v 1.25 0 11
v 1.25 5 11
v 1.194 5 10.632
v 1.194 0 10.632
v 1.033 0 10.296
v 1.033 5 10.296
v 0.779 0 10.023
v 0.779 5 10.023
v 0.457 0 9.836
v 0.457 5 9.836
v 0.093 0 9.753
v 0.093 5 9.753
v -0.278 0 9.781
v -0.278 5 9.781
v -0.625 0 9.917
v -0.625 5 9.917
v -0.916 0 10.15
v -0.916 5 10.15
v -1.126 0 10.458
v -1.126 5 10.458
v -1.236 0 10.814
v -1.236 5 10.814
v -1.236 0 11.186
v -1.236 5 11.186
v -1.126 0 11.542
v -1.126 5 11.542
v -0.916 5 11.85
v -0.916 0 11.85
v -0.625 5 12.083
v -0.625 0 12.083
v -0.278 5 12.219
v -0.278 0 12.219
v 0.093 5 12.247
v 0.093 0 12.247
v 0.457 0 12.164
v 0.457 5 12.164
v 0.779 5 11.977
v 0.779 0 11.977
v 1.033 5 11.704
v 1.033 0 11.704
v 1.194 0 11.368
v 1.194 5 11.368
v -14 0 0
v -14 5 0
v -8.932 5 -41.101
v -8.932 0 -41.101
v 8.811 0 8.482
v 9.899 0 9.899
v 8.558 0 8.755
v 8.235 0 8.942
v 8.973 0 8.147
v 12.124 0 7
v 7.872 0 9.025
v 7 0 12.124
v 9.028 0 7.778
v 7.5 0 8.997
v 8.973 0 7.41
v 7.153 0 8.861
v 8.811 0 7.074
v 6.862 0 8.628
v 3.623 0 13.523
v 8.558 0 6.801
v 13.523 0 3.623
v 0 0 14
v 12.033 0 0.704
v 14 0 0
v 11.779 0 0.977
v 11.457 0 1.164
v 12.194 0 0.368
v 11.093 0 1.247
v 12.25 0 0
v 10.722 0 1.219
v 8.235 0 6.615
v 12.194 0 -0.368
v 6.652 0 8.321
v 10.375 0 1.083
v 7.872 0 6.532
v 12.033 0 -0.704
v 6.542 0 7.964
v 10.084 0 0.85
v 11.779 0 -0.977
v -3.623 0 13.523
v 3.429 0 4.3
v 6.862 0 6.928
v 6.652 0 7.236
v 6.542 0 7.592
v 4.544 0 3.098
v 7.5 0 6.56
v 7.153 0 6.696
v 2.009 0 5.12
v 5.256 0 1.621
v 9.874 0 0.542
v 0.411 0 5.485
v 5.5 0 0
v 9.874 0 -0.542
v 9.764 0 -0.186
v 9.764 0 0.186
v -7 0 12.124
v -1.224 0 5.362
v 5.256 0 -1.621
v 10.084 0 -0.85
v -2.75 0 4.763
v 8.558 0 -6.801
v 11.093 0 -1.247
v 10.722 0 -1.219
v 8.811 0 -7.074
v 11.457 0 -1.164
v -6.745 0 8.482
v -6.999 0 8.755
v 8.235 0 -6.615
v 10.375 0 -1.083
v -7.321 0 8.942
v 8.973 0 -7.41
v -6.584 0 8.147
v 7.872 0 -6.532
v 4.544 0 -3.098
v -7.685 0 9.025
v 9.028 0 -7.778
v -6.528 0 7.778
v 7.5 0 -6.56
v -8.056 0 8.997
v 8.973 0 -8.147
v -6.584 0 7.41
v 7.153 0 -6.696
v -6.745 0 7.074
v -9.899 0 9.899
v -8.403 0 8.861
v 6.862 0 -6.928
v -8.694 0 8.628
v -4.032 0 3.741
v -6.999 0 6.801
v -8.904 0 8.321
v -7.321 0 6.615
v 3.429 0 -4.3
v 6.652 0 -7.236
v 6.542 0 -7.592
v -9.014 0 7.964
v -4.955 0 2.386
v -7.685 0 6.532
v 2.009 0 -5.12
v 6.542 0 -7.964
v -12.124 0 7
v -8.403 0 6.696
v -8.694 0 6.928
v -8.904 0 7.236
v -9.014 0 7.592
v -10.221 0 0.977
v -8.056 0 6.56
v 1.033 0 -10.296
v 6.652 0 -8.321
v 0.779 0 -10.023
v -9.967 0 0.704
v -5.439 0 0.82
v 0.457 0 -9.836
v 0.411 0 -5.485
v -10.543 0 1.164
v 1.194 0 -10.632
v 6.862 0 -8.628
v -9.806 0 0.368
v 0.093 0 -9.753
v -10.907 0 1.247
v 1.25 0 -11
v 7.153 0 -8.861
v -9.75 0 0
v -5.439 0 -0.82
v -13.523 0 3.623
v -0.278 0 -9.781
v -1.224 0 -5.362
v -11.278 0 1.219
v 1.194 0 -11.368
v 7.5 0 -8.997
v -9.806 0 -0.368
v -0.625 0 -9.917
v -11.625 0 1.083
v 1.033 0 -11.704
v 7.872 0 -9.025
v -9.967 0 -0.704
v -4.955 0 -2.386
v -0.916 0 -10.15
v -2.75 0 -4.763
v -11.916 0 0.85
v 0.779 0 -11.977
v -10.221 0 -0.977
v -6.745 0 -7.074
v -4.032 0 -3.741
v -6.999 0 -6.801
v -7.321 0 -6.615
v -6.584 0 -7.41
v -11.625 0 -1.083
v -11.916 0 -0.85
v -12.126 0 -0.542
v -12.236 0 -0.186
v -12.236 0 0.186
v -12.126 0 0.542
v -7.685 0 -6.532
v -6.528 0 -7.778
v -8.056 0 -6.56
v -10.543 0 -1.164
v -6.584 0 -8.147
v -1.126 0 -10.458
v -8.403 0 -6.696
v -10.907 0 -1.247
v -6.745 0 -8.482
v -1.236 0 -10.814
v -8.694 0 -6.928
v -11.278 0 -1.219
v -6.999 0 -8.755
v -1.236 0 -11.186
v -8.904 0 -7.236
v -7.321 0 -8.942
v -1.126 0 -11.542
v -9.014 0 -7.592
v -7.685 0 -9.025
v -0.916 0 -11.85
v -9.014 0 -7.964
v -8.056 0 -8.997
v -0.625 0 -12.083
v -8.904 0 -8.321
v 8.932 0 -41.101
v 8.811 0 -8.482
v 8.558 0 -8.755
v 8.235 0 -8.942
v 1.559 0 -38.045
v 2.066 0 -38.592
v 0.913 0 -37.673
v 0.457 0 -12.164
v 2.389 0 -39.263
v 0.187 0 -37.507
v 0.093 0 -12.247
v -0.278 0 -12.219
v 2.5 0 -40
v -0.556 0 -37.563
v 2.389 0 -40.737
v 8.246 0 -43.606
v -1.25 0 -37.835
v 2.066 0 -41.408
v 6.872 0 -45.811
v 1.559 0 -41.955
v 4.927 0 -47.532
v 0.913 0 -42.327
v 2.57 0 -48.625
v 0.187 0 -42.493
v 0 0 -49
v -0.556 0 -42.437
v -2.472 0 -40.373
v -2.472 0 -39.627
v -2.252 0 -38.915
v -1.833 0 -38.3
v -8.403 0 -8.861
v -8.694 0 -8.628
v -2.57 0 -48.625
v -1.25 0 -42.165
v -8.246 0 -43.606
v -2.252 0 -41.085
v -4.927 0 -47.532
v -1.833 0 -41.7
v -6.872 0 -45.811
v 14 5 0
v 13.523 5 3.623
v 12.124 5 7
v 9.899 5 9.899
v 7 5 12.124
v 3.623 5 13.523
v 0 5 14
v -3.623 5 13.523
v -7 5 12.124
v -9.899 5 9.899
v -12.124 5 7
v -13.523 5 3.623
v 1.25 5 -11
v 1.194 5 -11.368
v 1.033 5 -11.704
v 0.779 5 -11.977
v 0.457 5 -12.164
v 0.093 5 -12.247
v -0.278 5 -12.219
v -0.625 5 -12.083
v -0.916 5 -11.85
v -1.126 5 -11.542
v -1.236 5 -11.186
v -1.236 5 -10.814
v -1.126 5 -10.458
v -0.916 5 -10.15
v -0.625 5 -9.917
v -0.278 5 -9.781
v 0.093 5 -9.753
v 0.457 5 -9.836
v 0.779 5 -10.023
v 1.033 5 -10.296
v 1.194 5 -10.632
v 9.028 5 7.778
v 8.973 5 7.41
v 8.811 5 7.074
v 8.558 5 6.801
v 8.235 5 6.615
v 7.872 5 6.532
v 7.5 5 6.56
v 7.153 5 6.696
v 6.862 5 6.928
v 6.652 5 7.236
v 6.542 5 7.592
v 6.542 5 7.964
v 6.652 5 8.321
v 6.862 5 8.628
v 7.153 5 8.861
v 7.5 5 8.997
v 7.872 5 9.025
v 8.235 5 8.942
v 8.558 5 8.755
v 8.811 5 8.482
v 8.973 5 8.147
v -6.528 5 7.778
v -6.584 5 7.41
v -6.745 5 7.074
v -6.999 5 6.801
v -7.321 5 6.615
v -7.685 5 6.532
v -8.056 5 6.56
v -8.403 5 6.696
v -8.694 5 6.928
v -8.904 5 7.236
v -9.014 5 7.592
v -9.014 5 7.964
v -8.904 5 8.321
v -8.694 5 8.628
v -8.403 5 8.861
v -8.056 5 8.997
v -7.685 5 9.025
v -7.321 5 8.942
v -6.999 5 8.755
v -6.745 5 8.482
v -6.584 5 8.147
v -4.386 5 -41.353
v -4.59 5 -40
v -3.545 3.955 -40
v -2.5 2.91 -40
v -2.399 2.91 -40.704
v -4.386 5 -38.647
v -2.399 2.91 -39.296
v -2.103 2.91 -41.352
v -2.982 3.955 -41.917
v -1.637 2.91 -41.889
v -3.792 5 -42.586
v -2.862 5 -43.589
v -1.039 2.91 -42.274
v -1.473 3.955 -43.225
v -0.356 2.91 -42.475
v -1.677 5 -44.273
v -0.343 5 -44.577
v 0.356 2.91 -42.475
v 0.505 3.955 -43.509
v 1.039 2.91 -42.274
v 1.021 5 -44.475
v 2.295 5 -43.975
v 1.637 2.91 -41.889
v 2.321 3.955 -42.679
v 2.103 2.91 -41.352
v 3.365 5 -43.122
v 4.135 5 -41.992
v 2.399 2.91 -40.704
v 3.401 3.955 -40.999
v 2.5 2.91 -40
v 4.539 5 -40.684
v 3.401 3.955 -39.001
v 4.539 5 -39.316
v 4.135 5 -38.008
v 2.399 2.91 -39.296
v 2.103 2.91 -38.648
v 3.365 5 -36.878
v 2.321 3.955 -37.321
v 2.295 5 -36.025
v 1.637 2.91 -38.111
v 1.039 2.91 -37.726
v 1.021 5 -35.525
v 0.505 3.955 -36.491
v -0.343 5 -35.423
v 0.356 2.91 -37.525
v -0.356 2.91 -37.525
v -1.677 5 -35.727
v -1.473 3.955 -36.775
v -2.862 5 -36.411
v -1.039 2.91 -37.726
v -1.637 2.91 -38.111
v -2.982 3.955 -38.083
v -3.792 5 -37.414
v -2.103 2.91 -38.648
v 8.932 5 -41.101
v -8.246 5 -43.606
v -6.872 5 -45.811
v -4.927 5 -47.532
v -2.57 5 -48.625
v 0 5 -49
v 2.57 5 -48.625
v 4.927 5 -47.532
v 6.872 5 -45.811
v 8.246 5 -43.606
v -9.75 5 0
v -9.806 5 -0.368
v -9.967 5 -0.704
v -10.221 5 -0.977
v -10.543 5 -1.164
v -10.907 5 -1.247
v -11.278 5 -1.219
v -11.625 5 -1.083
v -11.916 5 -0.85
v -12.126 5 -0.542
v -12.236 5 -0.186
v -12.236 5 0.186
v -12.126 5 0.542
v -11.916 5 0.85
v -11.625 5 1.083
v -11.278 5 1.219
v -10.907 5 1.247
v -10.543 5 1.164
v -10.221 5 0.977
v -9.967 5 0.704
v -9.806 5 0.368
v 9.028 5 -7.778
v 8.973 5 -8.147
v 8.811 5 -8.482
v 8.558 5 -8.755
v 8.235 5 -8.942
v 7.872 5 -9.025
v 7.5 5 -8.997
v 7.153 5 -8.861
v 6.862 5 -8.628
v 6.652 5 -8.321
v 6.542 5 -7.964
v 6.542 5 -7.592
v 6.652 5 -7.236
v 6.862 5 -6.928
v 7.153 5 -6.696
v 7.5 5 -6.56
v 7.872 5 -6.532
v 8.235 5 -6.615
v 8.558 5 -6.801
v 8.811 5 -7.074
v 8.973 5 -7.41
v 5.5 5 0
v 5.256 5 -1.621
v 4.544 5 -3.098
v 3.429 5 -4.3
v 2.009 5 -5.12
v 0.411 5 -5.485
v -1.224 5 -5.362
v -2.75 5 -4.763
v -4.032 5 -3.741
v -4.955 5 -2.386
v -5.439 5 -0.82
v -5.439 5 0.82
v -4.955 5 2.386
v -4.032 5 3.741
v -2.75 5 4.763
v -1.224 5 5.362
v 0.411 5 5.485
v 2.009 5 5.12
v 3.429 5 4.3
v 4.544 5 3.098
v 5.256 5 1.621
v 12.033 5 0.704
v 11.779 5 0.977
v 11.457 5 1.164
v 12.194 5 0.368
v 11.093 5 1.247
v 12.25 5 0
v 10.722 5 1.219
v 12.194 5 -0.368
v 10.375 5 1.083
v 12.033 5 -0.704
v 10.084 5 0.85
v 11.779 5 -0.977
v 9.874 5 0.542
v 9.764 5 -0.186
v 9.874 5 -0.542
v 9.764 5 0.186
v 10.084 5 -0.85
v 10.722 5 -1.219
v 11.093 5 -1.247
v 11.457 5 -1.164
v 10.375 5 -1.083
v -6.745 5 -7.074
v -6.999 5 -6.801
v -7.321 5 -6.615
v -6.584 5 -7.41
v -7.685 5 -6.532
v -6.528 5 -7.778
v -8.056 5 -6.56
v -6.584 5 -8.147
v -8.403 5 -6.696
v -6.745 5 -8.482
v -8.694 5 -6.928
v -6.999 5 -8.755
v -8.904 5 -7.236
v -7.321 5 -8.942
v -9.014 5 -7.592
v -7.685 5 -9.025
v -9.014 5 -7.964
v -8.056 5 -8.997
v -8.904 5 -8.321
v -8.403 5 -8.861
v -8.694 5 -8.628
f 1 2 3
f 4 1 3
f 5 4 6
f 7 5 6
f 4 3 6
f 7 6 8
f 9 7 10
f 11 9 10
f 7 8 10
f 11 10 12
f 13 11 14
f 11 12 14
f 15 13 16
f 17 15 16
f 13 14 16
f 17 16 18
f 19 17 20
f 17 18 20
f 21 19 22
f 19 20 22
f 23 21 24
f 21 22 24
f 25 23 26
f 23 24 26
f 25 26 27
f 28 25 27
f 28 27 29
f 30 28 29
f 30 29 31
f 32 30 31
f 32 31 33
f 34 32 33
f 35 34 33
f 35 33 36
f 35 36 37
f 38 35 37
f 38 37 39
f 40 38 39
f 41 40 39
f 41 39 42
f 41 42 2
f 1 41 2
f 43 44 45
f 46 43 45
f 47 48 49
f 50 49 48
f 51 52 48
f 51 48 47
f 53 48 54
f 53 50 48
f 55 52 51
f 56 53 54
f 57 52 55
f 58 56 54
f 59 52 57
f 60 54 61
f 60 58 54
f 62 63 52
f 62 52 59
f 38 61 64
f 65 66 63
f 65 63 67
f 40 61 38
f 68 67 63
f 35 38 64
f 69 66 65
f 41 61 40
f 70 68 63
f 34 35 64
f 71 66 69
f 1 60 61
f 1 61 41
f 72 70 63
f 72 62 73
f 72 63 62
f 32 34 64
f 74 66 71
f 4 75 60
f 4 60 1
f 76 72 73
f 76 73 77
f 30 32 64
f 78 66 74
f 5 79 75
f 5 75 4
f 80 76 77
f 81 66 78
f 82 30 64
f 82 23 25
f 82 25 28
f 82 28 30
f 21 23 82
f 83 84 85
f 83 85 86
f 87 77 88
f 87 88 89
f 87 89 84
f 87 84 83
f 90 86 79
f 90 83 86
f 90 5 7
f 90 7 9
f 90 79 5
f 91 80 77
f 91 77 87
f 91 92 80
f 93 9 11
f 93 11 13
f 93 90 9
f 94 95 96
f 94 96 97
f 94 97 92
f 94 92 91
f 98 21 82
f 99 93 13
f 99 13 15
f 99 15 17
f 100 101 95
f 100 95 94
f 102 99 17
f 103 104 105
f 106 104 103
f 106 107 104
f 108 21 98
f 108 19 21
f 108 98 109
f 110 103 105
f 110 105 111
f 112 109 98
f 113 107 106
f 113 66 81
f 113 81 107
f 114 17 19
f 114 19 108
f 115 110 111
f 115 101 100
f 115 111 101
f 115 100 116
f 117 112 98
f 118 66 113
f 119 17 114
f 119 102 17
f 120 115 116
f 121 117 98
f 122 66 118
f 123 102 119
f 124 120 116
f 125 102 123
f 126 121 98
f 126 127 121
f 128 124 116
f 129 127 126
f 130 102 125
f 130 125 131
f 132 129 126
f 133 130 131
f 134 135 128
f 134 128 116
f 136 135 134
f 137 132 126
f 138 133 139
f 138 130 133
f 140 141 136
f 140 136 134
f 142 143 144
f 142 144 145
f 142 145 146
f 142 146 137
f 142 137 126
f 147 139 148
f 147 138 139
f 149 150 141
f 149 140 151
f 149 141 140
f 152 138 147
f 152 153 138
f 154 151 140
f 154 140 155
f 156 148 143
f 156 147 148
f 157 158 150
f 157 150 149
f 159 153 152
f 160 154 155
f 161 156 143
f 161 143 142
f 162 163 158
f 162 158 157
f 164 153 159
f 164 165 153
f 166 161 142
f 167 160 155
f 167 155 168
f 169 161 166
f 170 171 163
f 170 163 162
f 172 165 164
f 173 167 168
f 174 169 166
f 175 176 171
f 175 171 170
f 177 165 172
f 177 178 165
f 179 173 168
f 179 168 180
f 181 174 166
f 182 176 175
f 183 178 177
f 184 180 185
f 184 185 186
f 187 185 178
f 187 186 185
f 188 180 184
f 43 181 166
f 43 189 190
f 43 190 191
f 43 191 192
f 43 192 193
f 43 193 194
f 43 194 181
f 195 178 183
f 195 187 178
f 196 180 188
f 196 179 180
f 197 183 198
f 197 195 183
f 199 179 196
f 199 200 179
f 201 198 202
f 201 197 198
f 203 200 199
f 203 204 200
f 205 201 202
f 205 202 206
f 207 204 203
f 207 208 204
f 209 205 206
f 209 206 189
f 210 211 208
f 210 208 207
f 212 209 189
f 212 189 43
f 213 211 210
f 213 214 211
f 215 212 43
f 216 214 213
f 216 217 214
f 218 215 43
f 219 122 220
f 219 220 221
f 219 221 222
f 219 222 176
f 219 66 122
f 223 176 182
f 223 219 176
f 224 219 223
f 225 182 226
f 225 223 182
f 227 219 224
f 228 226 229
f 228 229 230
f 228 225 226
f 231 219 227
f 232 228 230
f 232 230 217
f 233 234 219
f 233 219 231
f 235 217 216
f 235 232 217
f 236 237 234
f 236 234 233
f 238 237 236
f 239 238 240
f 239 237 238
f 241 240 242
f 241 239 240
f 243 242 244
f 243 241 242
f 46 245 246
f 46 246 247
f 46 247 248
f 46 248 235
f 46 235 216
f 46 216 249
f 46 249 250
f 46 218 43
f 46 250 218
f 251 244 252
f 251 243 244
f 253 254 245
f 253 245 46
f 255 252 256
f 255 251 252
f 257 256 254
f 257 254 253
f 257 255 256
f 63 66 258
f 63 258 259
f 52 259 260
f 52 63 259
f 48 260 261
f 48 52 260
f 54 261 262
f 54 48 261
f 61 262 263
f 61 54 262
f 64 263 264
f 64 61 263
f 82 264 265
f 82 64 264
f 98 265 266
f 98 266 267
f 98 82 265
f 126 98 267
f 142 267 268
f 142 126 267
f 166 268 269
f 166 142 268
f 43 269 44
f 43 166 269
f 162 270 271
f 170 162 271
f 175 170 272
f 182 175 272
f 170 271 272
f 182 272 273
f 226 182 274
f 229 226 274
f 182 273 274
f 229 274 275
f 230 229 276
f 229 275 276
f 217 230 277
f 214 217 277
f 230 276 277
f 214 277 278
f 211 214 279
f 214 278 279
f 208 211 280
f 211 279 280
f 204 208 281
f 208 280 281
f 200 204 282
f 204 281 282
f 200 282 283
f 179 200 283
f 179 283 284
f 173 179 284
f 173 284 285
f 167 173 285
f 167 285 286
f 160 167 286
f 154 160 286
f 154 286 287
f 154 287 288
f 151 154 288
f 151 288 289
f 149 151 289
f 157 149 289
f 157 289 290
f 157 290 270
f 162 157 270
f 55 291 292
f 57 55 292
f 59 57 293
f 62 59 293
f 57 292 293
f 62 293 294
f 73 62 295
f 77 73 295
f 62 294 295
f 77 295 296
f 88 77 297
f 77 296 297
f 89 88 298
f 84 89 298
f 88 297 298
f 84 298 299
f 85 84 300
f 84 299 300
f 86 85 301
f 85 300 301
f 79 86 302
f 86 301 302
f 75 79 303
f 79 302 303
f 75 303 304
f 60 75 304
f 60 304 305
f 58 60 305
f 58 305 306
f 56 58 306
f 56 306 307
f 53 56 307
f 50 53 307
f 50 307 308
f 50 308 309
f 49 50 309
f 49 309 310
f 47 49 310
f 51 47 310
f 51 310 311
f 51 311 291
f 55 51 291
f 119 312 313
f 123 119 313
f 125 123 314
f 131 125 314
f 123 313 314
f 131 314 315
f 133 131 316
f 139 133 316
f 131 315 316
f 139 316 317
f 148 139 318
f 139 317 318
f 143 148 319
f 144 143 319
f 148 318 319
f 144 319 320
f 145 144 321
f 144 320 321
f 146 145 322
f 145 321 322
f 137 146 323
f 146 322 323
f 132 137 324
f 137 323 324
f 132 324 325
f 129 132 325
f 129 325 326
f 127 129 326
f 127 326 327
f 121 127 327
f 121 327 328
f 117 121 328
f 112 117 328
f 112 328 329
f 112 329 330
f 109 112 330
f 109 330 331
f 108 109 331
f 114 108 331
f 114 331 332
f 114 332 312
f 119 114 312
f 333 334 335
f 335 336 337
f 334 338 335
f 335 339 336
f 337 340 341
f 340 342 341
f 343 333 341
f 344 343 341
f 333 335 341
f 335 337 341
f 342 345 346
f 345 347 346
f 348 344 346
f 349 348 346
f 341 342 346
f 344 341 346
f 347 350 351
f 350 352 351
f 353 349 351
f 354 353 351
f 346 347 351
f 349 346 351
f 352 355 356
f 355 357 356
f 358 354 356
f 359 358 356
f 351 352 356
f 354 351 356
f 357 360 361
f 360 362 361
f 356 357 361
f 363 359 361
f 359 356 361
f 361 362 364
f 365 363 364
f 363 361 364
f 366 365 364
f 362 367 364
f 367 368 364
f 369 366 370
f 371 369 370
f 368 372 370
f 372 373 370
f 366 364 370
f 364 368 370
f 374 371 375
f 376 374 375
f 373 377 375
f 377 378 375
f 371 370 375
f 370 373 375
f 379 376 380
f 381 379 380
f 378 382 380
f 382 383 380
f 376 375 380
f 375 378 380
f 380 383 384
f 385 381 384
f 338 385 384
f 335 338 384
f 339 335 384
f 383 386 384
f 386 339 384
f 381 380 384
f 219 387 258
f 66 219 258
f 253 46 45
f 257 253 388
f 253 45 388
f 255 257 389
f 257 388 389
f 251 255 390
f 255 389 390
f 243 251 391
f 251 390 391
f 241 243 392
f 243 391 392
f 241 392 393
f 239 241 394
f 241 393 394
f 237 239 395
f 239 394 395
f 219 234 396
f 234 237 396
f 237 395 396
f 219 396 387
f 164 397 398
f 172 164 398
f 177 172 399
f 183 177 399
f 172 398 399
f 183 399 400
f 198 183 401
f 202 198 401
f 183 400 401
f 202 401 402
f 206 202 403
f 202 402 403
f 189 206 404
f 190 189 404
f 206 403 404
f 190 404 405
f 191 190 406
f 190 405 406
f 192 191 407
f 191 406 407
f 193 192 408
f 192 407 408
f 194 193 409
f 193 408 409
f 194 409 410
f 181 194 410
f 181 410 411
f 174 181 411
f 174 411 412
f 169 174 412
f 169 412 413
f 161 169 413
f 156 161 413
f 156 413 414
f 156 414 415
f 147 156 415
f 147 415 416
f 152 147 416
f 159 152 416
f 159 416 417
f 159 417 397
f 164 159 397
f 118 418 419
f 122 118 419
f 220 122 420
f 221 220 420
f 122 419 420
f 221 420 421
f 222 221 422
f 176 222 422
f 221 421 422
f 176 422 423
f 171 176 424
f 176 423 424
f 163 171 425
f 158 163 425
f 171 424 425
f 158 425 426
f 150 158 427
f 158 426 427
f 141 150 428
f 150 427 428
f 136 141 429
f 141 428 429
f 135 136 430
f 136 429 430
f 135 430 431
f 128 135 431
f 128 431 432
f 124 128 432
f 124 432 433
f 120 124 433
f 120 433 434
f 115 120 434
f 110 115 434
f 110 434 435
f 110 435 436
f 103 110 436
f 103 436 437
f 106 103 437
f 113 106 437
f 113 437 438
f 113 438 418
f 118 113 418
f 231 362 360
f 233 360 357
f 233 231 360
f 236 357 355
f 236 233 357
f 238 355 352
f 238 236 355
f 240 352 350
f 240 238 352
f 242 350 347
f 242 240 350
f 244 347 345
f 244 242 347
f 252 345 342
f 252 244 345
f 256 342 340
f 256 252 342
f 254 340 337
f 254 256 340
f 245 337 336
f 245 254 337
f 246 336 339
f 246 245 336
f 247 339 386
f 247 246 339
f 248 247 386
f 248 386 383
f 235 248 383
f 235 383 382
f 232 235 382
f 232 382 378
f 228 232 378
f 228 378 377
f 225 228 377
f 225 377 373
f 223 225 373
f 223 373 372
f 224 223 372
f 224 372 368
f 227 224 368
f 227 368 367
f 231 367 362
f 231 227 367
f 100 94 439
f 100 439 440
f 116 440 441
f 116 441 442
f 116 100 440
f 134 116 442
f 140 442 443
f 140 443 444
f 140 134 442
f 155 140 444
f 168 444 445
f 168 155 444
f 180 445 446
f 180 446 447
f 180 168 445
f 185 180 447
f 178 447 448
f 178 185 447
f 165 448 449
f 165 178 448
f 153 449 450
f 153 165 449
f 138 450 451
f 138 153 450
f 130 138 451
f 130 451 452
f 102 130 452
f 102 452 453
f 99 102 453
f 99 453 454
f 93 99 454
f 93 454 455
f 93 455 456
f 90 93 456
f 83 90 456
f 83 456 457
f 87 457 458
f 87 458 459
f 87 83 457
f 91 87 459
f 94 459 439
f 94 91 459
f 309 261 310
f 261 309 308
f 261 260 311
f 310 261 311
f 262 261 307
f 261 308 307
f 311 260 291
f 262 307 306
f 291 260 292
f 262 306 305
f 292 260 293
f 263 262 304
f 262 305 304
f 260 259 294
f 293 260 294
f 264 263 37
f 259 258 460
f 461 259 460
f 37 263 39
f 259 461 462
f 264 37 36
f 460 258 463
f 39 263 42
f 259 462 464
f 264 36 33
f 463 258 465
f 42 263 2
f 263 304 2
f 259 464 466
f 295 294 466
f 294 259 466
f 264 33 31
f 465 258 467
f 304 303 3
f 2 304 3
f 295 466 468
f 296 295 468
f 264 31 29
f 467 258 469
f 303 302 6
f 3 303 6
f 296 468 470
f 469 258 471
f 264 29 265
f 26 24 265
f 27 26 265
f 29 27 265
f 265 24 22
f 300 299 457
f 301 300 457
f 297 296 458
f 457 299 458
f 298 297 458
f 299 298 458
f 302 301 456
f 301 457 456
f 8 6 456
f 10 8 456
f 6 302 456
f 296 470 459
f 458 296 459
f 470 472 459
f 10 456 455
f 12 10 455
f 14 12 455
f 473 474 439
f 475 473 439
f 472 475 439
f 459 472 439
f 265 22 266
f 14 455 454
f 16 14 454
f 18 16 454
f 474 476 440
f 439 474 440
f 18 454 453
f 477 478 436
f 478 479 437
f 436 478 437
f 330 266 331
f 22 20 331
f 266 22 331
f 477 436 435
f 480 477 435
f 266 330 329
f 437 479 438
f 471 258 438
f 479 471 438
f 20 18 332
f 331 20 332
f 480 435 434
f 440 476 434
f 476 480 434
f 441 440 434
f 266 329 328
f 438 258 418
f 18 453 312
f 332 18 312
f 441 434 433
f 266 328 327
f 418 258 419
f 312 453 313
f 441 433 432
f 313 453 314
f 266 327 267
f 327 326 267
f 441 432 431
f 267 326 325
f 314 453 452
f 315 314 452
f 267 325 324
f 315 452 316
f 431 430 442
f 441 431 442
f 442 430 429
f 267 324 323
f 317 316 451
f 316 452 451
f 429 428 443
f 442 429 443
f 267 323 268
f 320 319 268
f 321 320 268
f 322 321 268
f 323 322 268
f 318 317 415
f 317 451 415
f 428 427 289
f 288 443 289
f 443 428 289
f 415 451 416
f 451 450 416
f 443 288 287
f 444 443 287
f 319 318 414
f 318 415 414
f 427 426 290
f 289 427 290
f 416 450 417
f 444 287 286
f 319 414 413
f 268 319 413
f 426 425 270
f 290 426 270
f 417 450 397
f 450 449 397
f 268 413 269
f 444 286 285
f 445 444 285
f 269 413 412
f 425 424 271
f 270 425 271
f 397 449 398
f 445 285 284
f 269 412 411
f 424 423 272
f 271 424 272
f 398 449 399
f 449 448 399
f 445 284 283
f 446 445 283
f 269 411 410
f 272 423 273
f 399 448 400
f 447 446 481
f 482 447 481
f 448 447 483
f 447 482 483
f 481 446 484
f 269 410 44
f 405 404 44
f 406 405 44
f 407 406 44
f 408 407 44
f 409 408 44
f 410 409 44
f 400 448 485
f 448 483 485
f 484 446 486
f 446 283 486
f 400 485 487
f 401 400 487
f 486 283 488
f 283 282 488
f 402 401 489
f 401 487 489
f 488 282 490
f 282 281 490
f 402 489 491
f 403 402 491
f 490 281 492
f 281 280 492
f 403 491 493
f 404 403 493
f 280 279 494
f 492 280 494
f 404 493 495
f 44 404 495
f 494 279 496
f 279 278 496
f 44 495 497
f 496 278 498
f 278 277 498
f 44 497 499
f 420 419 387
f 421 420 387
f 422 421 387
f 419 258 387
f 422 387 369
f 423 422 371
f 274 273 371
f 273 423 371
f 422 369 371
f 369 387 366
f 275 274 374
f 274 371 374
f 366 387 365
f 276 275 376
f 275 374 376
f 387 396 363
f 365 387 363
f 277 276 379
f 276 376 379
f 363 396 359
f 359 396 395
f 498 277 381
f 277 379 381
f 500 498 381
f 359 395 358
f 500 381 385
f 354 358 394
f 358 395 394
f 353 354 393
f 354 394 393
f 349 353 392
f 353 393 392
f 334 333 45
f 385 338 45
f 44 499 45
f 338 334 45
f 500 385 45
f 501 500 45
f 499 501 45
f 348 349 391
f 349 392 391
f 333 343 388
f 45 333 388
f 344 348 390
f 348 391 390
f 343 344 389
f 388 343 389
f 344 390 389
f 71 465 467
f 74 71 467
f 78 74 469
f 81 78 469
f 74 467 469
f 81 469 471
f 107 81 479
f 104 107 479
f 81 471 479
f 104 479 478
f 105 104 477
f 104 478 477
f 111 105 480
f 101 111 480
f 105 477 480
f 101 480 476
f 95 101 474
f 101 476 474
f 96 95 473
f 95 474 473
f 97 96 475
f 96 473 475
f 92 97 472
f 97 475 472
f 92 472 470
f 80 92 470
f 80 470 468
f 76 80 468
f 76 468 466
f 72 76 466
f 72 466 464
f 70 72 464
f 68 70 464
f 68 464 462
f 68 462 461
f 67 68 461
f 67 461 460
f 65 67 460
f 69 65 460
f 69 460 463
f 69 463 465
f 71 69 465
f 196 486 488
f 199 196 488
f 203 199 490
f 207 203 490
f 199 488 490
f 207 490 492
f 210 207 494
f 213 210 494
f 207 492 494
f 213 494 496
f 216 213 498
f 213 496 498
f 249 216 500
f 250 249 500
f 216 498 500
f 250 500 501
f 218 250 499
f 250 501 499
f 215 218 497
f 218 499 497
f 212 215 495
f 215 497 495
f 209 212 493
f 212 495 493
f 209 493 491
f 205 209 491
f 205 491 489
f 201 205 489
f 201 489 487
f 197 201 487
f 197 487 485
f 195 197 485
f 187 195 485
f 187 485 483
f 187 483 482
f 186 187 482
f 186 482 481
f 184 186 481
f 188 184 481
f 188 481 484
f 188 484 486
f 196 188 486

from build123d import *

# Parameters (mm, degrees)
SKETCH1_R                                            = 2.5
SKETCH1_R_2                                          = 5.5
BOSS_EXTRUDE1_DEPTH                                  = 5
SKETCH2_R                                            = 1.25
CUT_EXTRUDE1_DEPTH                                   = 6
CUT_EXTRUDE2_DEPTH                                   = 6
CSK_FOR_M4_HEX_SOCKET_COUNTERSUNK_HEAD_S_D           = 4.5
CSK_FOR_M4_HEX_SOCKET_COUNTERSUNK_HEAD_S_CSINK_D     = 9.18
CSK_FOR_M4_HEX_SOCKET_COUNTERSUNK_HEAD_S_CSINK_ANGLE = 90


with BuildPart() as part:
    # Sketch1 → Boss-Extrude1 (new body)
    with BuildSketch(Plane(origin=(0, 0, 0), x_dir=(1, 0, 0), z_dir=(0, 1, 0))):
        with BuildLine():
            Line((-14, 0), (-14, 40))
            ThreePointArc((-14, 40), (0, 54), (14, 40))
            Line((14, 40), (14, 0))
            ThreePointArc((14, 0), (0, -14), (-14, 0))
        make_face()
        with Locations((0, 40)):
            Circle(SKETCH1_R, mode=Mode.SUBTRACT)
        Circle(SKETCH1_R_2, mode=Mode.SUBTRACT)
    extrude(amount=BOSS_EXTRUDE1_DEPTH)

    # Sketch2 → Cut-Extrude1 (cut, through all)
    with BuildSketch(Plane(origin=(0, 5, 0), x_dir=(1, 0, 0), z_dir=(0, 1, 0))):
        with Locations((0, 11)):
            Circle(SKETCH2_R)
        with Locations((7.778174593, 7.778174593)):
            Circle(SKETCH2_R)
        with Locations((11, 0)):
            Circle(SKETCH2_R)
        with Locations((7.778174593, -7.778174593)):
            Circle(SKETCH2_R)
        with Locations((0, -11)):
            Circle(SKETCH2_R)
        with Locations((-7.778174593, -7.778174593)):
            Circle(SKETCH2_R)
        with Locations((-11, 0)):
            Circle(SKETCH2_R)
        with Locations((-7.778174593, 7.778174593)):
            Circle(SKETCH2_R)
    extrude(amount=-CUT_EXTRUDE1_DEPTH, mode=Mode.SUBTRACT)

    # Sketch3 → Cut-Extrude2 (cut, through all)
    with BuildSketch(Plane(origin=(0, 5, 0), x_dir=(1, 0, 0), z_dir=(0, 1, 0))):
        with BuildLine():
            Line((-14, 40), (-14, 0))
            Line((-14, 0), (-8.932361388, 41.101326486))
            ThreePointArc((-8.932361388, 41.101326486), (0, 49), (8.932361388, 41.101326486))
            Line((8.932361388, 41.101326486), (14, 0))
            Line((14, 0), (14, 40))
            ThreePointArc((14, 40), (0, 54), (-14, 40))
        make_face()
    extrude(amount=-CUT_EXTRUDE2_DEPTH, mode=Mode.SUBTRACT)

    # CSK for M4 Hex Socket Countersunk Head Screw2 (through all)
    with Locations(Plane(origin=(0, 5, 0), x_dir=(1, 0, 0), z_dir=(0, 1, 0))):
        with Locations((0, 40)):
            CounterSinkHole(CSK_FOR_M4_HEX_SOCKET_COUNTERSUNK_HEAD_S_D / 2, CSK_FOR_M4_HEX_SOCKET_COUNTERSUNK_HEAD_S_CSINK_D / 2, counter_sink_angle=CSK_FOR_M4_HEX_SOCKET_COUNTERSUNK_HEAD_S_CSINK_ANGLE)


solid = part.part
